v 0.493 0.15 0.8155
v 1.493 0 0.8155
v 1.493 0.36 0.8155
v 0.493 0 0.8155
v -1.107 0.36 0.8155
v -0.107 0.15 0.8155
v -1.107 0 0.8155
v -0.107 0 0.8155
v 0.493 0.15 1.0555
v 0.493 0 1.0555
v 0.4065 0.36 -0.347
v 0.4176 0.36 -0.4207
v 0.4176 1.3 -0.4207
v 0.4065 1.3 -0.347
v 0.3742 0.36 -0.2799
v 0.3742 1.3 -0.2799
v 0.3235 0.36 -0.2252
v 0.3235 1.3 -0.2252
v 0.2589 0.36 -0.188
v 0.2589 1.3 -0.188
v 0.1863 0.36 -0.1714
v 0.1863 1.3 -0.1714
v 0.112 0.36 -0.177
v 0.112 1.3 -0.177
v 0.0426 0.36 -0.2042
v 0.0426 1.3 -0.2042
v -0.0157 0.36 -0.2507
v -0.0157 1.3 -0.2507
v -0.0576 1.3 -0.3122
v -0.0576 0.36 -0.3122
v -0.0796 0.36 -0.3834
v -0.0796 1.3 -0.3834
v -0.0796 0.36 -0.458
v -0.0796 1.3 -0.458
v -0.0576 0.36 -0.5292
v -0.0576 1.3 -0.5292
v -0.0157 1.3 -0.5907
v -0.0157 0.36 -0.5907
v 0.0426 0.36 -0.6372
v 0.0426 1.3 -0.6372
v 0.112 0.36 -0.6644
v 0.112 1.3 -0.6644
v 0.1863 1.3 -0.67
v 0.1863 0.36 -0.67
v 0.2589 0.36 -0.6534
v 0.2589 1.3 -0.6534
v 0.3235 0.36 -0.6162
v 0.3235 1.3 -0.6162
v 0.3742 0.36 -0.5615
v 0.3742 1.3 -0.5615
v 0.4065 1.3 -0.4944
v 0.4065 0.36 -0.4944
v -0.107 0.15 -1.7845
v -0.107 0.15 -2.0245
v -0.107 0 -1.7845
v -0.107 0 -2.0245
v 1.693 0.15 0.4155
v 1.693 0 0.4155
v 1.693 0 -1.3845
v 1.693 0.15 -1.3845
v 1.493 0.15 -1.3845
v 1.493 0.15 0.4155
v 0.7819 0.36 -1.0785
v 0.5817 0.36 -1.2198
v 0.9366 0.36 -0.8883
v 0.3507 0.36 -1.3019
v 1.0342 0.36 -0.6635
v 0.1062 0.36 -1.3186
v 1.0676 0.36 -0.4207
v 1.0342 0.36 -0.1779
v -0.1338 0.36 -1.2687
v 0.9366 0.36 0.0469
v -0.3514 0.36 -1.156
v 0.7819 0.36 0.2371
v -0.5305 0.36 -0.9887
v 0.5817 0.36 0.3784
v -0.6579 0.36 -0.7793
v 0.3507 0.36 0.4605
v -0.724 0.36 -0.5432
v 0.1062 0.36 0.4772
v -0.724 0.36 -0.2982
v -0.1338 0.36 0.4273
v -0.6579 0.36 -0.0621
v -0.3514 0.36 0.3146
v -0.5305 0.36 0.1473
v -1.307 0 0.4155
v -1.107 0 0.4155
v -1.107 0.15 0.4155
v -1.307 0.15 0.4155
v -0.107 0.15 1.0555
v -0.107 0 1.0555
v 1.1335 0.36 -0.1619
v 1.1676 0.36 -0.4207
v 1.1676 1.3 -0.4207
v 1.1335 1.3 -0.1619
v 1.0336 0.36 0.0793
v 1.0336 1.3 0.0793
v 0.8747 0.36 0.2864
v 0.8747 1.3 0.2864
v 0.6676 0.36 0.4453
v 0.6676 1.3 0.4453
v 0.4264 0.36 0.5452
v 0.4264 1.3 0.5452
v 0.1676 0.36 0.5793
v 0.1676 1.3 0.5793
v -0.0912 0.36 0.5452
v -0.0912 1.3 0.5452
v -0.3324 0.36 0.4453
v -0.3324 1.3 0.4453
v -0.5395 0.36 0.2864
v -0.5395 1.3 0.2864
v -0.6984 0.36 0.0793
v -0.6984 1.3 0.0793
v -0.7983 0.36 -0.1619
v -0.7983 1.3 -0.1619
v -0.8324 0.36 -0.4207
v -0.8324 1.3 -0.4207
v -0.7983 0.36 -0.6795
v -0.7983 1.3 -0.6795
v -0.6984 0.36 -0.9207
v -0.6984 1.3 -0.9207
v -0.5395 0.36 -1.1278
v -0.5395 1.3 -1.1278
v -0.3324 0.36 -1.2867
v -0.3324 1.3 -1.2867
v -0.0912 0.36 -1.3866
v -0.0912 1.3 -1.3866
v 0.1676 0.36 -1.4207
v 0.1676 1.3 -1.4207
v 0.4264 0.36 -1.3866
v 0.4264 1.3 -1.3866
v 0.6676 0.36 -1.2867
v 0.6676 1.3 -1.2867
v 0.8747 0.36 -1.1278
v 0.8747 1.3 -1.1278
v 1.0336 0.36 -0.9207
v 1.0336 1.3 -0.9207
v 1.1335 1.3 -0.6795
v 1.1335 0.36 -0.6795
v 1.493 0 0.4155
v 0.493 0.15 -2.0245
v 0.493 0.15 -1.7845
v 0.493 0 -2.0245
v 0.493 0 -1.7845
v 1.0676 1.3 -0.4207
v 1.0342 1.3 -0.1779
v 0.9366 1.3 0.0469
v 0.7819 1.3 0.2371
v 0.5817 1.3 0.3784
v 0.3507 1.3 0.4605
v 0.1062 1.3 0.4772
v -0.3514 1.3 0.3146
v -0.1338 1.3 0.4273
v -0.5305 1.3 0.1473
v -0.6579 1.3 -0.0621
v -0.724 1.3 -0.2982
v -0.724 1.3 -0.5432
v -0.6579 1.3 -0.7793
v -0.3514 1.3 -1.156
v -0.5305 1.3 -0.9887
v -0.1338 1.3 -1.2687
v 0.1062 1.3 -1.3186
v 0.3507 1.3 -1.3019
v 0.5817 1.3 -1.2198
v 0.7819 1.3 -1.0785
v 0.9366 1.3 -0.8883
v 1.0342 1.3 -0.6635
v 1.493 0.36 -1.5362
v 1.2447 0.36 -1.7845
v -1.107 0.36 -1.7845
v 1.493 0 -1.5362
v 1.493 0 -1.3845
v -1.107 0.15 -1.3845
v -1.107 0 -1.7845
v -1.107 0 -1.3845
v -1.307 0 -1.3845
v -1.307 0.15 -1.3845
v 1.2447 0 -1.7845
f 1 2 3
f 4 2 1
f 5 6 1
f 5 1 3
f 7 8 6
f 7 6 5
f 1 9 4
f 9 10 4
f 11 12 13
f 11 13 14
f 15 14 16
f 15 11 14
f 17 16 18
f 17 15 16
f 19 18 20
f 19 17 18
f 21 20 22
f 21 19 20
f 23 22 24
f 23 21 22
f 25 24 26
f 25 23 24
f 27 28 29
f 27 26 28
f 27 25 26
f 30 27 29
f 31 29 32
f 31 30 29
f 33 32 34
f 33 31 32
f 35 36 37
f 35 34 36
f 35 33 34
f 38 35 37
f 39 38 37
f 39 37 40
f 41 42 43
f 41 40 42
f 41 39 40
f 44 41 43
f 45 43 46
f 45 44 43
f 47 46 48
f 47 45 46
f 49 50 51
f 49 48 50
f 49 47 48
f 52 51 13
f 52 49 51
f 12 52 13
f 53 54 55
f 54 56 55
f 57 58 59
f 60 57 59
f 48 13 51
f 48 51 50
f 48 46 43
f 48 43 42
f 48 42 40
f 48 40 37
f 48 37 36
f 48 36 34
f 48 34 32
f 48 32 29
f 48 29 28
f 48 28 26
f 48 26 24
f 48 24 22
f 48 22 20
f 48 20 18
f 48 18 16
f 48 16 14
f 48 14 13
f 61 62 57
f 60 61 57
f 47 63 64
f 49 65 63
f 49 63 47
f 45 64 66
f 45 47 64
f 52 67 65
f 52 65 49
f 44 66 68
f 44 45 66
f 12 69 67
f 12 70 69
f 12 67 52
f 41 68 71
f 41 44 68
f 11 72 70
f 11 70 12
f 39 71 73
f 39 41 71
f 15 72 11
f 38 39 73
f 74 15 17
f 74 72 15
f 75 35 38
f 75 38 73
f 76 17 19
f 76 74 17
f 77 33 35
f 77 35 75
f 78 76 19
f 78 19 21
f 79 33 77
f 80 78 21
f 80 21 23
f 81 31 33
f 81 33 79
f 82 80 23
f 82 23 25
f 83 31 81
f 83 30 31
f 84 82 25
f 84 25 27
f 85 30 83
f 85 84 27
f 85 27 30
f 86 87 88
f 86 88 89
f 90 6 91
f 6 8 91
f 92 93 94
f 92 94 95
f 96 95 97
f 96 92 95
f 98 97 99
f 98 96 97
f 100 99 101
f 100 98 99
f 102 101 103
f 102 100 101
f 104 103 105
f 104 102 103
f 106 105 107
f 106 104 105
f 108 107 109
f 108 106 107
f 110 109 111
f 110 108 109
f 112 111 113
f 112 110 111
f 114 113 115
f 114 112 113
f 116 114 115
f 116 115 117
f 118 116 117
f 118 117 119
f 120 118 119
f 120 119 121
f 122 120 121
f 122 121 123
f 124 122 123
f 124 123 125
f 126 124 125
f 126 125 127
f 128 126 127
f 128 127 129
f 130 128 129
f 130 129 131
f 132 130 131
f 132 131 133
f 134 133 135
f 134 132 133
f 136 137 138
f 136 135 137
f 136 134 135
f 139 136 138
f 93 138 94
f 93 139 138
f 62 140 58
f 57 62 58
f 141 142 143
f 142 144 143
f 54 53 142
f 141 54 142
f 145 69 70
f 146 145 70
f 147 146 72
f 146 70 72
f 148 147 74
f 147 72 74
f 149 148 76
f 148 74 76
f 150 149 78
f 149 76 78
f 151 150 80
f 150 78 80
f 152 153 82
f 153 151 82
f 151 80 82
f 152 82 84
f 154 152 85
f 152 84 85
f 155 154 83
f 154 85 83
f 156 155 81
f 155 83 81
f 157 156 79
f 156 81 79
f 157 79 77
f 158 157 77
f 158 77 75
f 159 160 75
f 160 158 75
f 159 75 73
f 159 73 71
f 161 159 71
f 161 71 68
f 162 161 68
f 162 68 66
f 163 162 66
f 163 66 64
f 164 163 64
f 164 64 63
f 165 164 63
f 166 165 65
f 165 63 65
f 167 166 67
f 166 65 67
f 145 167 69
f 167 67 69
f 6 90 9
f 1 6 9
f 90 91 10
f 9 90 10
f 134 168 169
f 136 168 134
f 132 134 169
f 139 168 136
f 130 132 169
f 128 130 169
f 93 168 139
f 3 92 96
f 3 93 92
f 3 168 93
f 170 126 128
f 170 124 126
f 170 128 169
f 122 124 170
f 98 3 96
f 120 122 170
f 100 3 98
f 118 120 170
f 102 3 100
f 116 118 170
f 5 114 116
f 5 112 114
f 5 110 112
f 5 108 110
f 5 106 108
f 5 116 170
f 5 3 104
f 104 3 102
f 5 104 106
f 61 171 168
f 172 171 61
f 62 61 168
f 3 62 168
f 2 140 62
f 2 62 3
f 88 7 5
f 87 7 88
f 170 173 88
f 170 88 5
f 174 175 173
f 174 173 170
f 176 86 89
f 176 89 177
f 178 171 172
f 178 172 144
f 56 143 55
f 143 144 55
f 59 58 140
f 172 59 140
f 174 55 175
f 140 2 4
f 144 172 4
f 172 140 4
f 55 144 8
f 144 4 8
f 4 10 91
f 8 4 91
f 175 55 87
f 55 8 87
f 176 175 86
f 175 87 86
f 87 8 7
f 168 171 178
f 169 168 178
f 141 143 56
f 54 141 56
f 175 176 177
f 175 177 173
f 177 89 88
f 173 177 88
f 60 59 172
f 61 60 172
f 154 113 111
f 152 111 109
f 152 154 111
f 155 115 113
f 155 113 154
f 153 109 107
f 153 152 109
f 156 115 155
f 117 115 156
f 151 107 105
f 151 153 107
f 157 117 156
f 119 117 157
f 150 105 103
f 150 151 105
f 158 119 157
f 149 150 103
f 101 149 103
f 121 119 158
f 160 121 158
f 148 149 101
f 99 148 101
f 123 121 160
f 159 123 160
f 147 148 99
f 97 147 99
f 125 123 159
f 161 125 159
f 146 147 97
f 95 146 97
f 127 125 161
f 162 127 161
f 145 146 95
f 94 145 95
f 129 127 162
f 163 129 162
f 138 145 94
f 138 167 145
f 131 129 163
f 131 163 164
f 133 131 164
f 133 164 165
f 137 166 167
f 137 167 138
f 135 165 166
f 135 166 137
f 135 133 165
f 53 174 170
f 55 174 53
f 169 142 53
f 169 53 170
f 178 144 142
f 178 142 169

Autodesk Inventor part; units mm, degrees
ref_plane "YZ Plane" through (0, 0, 0) normal (1, 0, 0) x (0, 1, 0)
ref_plane "XZ Plane" through (0, 0, 0) normal (0, 1, 0) x (-1, 0, 0)
ref_plane "XY Plane" through (0, 0, 0) normal (0, 0, 1) x (1, 0, 0)
sketch "Sketch1" plane through (0, 0, 0) normal (0, 1, 0) x (-1, 0, 0)
  line L0 (-1.493, 0.8155) -> (1.107, 0.8155)
  line L1 (1.107, 0.8155) -> (1.107, -1.7845)
  line L2 (1.107, -1.7845) -> (-1.2447, -1.7845)
  line L3 (-1.493, -1.5362) -> (-1.493, 0.8155)
  line L4 (-1.493, -1.5362) -> (-1.2447, -1.7845)
  point P0 (0, 0)
  dimension "d0" = 2.6
  dimension "d1" = 2.6
extrude "Extrusion1" add sketch "Sketch1" along normal blind 0.36
sketch "Sketch2" plane through (0, 0.36, 0) normal (0, 1, 0) x (1, 0, 0)
  circle A0 centre (0.1676, 0.4207) radius 1
  circle A1 centre (0.1676, 0.4207) radius 0.25
  circle A2 centre (0.1676, 0.4207) radius 0.9
  point P0 (0, 0)
  dimension "d4" = 2
  dimension "d5" = 0.5
  dimension "d6" = 1.8
extrude "Extrusion2" add sketch "Sketch2" along normal blind 0.94
sketch "Sketch3" plane through (0, 0, 0) normal (0, -1, 0) x (1, 0, 0)
  line L0 (1.493, 0.8155) -> (-1.107, 0.8155) projected
  line L1 (-1.107, 0.8155) -> (-1.107, -1.7845) projected
  line L2 (-1.107, -1.7845) -> (1.2447, -1.7845) projected
  line L3 (1.493, -1.5362) -> (1.493, 0.8155) projected
  line L4 (0.493, -2.0245) -> (-0.107, -2.0245)
  line L5 (-0.107, -2.0245) -> (-0.107, -1.7845)
  line L6 (0.493, -1.7845) -> (0.493, -2.0245)
  line L7 (-0.107, 1.0555) -> (0.493, 1.0555)
  line L8 (0.493, 1.0555) -> (0.493, 0.8155)
  line L9 (-0.107, 0.8155) -> (-0.107, 1.0555)
  line L10 (1.693, -1.3845) -> (1.493, -1.3845)
  line L11 (1.493, 0.4155) -> (1.693, 0.4155)
  line L12 (1.693, 0.4155) -> (1.693, -1.3845)
  line L13 (-1.307, -1.3845) -> (-1.107, -1.3845)
  line L14 (-1.107, 0.4155) -> (-1.307, 0.4155)
  line L15 (-1.307, 0.4155) -> (-1.307, -1.3845)
  line L16 (1.493, 0.4155) -> (1.493, -1.3845)
  line L17 (-1.107, 0.4155) -> (-1.107, -1.3845)
  line L18 (0.493, 0.8155) -> (-0.107, 0.8155)
  line L19 (0.493, -1.7845) -> (-0.107, -1.7845)
  point P0 (0, 0)
  dimension "d9" = 1.8
  dimension "d10" = 1.8
  dimension "d11" = 0.6
  dimension "d12" = 0.6
  dimension "d13" = 3.08
  dimension "d14" = 3
  dimension "d15" = 0.2
  dimension "d17" = 0.4
  dimension "d18" = 0.4
  dimension "d19" = 0.24
  dimension "d20" = 1
  dimension "d21" = 1
extrude "Extrusion3" add sketch "Sketch3" against normal blind 0.15
properties part number "UMCC"
